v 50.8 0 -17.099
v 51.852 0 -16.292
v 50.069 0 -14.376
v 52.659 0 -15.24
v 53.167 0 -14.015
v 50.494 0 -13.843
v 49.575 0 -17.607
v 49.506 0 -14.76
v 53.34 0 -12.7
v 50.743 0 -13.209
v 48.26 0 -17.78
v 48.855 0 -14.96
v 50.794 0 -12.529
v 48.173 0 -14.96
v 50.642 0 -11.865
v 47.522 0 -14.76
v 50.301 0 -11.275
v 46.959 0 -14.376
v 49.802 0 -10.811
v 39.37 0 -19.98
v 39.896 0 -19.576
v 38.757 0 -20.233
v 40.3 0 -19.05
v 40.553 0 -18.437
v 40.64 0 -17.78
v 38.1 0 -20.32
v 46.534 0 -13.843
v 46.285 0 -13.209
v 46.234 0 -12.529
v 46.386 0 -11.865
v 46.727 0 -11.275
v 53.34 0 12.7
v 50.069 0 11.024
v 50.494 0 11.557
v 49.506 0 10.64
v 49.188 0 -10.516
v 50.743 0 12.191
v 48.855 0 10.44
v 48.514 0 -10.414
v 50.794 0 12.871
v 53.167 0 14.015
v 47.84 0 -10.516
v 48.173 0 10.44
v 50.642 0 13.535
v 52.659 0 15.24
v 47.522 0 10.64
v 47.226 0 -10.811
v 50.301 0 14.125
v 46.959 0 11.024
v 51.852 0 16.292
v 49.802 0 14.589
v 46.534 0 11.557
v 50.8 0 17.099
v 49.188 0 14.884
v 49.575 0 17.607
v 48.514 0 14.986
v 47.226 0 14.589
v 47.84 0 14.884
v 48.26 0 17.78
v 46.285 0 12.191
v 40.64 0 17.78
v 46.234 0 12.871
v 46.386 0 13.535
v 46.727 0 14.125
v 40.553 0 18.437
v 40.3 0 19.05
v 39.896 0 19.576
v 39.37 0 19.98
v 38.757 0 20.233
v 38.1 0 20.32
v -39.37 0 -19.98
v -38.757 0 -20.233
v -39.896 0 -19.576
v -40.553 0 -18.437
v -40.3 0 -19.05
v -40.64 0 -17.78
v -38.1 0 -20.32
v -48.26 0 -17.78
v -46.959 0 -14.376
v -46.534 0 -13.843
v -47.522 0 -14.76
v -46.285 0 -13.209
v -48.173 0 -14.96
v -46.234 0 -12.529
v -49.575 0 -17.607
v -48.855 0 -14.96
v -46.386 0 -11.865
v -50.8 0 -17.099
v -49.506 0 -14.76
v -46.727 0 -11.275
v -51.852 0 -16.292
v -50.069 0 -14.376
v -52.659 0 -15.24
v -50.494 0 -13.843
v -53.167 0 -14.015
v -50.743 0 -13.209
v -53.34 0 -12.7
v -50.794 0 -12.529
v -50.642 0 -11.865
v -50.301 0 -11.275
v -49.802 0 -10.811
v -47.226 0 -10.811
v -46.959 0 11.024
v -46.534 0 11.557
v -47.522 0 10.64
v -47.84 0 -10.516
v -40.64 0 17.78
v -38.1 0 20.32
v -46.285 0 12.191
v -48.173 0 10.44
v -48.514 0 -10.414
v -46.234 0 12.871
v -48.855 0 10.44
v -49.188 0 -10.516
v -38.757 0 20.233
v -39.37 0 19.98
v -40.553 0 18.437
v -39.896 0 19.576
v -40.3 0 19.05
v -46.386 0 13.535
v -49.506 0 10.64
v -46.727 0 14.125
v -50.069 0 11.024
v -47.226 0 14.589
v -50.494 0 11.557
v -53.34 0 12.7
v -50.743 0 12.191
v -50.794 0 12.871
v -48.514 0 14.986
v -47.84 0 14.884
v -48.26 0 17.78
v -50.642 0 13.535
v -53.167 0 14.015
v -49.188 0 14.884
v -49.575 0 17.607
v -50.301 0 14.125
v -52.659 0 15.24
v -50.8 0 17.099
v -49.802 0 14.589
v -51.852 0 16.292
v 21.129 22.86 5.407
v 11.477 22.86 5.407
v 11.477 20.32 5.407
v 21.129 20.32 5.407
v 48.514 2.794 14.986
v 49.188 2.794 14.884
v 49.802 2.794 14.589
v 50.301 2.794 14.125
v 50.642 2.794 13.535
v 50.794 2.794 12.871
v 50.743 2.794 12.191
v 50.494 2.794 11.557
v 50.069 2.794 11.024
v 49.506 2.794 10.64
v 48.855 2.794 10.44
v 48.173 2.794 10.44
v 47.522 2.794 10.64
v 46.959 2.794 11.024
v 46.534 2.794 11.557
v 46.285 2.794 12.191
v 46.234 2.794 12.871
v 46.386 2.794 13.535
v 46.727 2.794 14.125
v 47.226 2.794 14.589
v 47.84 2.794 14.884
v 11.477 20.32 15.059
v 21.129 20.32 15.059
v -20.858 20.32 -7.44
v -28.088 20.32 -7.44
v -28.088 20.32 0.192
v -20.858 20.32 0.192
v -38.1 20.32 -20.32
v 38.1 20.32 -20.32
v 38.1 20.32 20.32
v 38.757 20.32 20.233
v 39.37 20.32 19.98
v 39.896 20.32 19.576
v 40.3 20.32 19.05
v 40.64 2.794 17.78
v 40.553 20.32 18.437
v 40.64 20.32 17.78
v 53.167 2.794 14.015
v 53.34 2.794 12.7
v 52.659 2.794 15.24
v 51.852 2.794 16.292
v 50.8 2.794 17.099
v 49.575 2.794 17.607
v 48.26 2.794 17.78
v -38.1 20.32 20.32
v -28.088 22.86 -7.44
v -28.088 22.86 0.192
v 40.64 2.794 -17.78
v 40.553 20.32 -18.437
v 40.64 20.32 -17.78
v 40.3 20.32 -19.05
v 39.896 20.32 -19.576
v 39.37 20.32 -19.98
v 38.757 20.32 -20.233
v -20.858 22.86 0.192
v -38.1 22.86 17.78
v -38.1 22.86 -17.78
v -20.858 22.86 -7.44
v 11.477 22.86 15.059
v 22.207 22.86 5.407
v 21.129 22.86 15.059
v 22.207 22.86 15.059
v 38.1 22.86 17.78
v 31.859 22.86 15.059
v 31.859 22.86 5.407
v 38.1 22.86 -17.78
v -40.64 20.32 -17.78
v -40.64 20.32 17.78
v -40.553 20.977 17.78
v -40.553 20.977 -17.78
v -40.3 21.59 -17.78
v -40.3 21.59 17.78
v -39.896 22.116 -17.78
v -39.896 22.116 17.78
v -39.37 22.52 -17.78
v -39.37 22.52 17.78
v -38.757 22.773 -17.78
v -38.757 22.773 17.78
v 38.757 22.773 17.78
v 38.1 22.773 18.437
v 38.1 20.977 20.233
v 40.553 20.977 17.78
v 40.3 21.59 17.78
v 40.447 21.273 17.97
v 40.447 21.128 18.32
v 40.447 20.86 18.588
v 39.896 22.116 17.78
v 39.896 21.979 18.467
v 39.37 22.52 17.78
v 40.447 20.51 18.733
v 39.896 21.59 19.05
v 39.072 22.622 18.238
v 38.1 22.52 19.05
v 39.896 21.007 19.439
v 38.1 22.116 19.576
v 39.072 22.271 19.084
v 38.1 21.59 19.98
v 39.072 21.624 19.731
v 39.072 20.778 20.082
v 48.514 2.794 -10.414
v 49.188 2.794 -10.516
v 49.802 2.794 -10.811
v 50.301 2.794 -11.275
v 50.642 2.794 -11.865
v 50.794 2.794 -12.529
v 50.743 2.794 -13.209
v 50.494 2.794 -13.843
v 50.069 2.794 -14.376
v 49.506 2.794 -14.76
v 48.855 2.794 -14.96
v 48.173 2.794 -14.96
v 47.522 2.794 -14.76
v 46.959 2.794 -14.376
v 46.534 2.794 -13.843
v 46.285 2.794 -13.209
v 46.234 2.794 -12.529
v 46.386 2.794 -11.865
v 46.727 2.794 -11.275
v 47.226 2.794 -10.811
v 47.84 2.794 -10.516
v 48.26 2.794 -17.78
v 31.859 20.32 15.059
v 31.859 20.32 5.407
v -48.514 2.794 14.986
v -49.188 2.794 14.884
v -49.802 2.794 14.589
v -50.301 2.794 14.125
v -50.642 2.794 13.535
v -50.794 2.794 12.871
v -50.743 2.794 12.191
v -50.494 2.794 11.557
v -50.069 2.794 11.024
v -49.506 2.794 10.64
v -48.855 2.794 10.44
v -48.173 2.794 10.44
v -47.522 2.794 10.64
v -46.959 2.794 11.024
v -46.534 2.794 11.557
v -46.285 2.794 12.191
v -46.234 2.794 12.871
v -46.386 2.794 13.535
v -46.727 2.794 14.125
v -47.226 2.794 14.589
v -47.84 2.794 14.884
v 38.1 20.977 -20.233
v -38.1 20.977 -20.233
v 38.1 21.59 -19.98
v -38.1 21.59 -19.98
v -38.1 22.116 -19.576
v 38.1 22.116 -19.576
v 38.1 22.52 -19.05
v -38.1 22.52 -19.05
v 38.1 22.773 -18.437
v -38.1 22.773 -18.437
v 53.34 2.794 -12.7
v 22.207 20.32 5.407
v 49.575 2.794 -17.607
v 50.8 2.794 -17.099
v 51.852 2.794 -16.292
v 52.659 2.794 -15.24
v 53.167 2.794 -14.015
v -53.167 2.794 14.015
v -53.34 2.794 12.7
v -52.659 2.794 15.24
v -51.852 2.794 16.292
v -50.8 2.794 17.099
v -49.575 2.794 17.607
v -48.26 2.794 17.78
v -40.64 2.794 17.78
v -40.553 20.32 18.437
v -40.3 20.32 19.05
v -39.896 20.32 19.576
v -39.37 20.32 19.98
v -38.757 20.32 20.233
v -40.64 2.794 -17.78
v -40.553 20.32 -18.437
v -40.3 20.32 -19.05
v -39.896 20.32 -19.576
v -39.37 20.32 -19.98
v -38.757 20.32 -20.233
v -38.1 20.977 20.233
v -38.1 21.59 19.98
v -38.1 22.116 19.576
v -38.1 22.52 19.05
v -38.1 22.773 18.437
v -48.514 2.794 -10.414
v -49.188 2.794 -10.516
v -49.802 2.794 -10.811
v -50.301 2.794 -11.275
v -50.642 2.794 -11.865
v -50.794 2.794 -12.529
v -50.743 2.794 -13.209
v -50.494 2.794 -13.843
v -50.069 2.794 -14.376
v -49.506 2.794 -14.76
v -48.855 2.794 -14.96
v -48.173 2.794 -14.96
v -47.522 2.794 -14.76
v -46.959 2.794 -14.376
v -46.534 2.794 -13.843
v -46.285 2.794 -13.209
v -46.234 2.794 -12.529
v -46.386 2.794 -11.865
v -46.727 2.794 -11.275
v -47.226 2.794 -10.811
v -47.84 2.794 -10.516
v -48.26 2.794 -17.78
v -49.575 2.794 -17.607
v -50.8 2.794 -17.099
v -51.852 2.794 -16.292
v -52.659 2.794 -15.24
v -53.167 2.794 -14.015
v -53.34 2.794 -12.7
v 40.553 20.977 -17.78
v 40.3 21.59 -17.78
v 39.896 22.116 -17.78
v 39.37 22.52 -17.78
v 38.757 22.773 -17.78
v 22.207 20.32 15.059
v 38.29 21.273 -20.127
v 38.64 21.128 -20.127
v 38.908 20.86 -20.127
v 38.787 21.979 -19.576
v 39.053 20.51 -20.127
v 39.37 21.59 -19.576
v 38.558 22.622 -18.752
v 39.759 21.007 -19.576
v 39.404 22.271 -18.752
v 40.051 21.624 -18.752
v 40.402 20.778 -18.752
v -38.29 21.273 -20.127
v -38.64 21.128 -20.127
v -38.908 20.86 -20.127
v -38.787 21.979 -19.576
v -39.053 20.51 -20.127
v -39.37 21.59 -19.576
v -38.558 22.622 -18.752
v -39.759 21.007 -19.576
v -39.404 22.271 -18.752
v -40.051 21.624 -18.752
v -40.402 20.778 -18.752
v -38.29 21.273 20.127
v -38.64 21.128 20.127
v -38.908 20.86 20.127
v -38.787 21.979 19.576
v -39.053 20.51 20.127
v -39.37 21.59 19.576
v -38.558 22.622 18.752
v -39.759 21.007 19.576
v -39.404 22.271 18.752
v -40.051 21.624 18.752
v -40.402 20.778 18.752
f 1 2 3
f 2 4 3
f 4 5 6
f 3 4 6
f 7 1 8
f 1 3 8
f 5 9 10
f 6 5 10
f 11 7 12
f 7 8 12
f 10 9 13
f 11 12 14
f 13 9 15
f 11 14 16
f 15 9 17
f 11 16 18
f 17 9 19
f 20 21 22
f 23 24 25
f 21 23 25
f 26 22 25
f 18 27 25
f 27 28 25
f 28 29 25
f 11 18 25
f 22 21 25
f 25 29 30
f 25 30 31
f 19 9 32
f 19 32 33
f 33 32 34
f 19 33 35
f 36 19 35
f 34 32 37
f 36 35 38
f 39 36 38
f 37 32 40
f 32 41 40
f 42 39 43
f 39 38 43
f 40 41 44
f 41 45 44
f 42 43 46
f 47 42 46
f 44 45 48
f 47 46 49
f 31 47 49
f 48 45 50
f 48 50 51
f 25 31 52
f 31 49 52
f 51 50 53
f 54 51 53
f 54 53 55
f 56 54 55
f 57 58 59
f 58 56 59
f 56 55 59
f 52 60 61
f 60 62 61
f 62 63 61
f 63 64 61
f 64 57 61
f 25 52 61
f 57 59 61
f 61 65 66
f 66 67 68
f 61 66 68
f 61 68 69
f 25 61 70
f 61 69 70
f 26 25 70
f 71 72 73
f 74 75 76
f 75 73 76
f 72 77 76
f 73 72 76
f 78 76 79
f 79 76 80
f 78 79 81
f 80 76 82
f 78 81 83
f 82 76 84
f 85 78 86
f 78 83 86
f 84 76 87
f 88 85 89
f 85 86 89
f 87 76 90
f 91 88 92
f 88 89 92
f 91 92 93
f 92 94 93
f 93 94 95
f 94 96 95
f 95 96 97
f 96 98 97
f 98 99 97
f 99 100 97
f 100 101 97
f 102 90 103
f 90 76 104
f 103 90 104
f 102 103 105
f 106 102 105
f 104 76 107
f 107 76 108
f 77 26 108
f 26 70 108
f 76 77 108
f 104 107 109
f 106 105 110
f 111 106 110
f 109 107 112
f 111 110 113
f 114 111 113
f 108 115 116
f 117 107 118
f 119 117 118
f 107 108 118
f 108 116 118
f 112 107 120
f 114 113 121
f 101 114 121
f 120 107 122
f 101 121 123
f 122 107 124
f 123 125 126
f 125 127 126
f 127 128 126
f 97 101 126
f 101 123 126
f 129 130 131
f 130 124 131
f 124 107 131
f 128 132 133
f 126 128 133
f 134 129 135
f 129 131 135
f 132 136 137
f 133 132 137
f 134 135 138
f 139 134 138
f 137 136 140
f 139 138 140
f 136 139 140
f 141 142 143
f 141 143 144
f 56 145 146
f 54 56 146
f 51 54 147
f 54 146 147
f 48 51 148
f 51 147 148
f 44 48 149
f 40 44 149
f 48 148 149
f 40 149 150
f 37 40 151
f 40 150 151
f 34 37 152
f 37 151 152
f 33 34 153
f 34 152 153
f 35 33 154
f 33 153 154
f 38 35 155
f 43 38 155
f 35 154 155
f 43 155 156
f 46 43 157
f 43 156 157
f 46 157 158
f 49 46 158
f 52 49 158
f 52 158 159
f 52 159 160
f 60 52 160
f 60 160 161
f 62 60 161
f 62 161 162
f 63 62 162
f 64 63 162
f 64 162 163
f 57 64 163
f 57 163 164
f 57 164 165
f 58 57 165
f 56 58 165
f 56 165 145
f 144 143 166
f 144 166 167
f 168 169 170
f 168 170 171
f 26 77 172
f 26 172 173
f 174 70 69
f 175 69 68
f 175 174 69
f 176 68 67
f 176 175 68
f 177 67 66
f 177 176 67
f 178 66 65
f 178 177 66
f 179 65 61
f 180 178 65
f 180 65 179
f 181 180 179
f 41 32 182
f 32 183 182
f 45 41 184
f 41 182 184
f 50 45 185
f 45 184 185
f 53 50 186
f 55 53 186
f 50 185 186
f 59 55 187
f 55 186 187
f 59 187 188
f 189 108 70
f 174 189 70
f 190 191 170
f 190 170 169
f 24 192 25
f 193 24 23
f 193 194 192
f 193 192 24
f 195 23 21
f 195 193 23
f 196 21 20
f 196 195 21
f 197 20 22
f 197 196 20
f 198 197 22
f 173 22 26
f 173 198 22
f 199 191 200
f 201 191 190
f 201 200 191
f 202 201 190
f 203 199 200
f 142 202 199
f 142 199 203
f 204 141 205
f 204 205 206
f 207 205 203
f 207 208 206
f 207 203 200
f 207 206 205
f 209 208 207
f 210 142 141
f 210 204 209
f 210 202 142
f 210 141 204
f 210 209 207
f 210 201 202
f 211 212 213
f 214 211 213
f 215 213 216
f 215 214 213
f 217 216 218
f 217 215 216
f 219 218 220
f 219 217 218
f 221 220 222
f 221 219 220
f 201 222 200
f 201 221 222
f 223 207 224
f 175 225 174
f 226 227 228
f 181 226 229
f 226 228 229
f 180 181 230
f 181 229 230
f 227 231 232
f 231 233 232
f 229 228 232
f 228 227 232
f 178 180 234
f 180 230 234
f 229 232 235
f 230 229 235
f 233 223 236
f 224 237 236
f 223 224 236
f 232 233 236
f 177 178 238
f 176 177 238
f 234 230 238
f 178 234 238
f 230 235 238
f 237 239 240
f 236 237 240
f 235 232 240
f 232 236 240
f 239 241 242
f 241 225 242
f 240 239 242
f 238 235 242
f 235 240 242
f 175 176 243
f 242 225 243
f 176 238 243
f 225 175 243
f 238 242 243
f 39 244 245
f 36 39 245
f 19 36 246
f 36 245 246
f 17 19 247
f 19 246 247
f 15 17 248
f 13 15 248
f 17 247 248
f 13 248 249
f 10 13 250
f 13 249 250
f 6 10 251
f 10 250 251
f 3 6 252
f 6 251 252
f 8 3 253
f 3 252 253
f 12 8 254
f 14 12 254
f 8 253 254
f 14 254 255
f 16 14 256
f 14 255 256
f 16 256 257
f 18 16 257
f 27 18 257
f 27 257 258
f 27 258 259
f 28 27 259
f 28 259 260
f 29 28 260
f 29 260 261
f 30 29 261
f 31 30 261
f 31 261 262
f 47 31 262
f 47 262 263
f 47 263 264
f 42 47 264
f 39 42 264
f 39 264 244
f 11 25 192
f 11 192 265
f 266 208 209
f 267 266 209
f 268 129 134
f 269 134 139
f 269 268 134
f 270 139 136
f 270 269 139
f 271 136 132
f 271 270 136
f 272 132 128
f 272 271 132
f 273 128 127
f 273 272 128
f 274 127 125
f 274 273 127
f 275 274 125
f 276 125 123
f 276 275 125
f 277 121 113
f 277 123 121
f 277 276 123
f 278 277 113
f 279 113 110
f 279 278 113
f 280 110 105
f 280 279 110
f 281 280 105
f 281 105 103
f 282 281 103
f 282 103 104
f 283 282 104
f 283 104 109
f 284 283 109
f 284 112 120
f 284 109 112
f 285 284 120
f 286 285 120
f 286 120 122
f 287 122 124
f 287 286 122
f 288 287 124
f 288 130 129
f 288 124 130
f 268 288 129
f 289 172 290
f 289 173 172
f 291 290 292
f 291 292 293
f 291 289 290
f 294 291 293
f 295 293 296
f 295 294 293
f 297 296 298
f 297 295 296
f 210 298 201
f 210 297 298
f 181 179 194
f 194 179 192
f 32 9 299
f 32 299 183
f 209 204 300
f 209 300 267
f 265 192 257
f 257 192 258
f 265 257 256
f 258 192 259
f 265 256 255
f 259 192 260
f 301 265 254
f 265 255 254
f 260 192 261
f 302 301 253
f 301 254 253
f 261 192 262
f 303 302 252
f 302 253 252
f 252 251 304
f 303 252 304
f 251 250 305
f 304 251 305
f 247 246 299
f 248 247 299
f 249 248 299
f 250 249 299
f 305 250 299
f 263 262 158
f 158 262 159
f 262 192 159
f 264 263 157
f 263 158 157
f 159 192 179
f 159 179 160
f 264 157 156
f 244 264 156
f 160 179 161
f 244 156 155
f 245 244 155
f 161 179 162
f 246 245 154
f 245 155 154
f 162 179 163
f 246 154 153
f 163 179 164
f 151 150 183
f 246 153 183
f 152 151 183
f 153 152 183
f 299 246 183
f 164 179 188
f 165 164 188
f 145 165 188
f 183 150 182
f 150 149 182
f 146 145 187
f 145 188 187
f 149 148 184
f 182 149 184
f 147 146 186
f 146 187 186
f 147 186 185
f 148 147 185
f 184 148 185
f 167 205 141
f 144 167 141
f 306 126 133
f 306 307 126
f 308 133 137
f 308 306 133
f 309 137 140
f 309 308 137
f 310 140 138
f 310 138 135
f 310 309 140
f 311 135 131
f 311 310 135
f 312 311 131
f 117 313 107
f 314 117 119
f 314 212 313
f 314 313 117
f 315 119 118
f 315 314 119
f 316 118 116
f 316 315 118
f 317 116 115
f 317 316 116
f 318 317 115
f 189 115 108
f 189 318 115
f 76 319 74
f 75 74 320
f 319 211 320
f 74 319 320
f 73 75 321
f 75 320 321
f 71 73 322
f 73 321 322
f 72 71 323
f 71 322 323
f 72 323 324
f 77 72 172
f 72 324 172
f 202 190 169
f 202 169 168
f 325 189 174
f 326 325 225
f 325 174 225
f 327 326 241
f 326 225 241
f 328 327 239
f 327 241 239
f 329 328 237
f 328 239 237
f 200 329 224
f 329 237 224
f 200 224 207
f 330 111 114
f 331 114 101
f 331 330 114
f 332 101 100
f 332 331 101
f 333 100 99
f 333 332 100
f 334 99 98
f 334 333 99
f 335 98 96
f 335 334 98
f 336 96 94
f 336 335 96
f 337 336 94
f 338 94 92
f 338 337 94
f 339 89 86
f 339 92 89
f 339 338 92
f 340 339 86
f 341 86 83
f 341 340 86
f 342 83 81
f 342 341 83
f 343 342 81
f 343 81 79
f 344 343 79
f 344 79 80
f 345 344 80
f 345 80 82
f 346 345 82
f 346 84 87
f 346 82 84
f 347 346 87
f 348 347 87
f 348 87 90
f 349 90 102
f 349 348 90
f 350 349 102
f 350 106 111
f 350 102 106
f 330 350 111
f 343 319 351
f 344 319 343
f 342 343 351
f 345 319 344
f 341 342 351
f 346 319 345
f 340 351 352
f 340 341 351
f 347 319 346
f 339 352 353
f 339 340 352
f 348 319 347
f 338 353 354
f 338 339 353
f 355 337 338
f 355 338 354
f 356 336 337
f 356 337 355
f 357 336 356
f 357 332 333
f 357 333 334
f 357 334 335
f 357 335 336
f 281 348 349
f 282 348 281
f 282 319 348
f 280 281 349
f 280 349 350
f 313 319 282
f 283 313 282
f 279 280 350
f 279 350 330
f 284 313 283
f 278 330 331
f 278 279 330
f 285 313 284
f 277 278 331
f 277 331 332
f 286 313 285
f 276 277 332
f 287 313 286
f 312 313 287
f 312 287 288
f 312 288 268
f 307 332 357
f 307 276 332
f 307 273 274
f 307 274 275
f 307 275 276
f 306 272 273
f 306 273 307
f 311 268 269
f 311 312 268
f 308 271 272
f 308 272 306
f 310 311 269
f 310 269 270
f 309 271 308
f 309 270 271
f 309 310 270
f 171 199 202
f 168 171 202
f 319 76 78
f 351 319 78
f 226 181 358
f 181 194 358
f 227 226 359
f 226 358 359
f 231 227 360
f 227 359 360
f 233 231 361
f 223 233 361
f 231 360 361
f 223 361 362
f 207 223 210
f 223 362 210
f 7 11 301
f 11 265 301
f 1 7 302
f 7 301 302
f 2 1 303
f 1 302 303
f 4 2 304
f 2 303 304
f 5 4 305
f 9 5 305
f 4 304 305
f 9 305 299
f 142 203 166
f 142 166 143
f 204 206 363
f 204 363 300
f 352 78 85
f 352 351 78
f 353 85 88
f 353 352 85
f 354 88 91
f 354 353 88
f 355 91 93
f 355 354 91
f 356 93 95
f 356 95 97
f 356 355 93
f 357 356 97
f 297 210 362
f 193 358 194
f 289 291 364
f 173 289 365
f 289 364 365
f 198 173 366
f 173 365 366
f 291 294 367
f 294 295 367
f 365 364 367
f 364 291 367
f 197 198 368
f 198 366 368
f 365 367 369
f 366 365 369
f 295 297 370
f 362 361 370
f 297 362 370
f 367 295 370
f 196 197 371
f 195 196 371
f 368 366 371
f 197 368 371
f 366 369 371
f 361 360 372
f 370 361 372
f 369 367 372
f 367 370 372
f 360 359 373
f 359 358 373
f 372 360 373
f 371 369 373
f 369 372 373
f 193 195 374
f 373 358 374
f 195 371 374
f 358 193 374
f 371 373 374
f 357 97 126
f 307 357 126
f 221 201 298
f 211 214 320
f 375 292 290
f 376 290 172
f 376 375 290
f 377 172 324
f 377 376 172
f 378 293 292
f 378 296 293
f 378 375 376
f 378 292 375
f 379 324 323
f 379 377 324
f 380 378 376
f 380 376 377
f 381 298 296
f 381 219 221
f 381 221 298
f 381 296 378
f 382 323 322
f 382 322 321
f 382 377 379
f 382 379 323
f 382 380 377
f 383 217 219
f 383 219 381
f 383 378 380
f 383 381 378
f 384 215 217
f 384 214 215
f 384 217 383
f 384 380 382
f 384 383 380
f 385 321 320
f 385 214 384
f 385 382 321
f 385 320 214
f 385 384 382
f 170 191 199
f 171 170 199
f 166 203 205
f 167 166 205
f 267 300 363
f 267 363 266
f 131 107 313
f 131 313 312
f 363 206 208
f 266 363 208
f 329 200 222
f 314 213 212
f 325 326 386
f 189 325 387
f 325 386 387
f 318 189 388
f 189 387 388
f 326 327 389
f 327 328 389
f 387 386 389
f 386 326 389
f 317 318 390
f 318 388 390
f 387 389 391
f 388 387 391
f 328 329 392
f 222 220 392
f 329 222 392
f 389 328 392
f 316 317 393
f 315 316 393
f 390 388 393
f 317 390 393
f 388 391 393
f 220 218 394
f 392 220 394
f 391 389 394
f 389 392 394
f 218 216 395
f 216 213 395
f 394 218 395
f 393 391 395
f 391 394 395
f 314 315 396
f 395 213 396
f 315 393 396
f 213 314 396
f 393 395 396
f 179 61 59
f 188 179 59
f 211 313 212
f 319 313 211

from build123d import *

# Parameters (mm, degrees)
SKETCH1_W            = 81.28
SKETCH1_H            = 40.64
BOSS_EXTRUDE1_DEPTH  = 22.86
FILLET1_R            = 2.54
SKETCH2_W            = 12.7
SKETCH2_H            = 35.56
BOSS_EXTRUDE2_DEPTH  = 2.794
FILLET2_R            = 5.08
SKETCH3_R            = 2.286
CUT_EXTRUDE1_DEPTH   = 61.503738364
FILLET2_OF_MIRROR1_R = 5.08
SKETCH4_W            = 7.230266788
SKETCH4_H            = 7.631948276
SKETCH4_W_2          = 9.652
SKETCH4_H_2          = 9.652
CUT_EXTRUDE2_DEPTH   = 2.54


with BuildPart() as part:
    # Sketch1 → Boss-Extrude1 (new body)
    with BuildSketch(Plane(origin=(0, 0, 0), x_dir=(1, 0, 0), z_dir=(0, 1, 0))):
        Rectangle(SKETCH1_W, SKETCH1_H)
    extrude(amount=BOSS_EXTRUDE1_DEPTH)

    # Fillet1
    fillet1_edges = [part.edges().sort_by_distance(p)[0] for p in [
        (-40.64, 22.86, 0),
        (0, 22.86, 20.32),
        (40.64, 22.86, 0),
        (0, 22.86, -20.32),
        (40.64, 11.43, 20.32),
        (-40.64, 11.43, 20.32),
        (-40.64, 11.43, -20.32),
        (40.64, 11.43, -20.32),
    ]]
    fillet(fillet1_edges, radius=FILLET1_R)

    # Sketch2 → Boss-Extrude2 (add)
    with BuildSketch(Plane.XZ):
        with Locations((46.99, 0)):
            Rectangle(SKETCH2_W, SKETCH2_H)
    boss_extrude2 = extrude(amount=-BOSS_EXTRUDE2_DEPTH)

    # Fillet2
    fillet2_edges = [part.edges().sort_by_distance(p)[0] for p in [
        (53.34, 1.397, 17.78),
        (53.34, 1.397, -17.78),
    ]]
    fillet(fillet2_edges, radius=FILLET2_R)

    # Sketch3 → Cut-Extrude1 (cut, through all)
    with BuildSketch(Plane(origin=(0, 2.794, 0), x_dir=(1, 0, 0), z_dir=(0, 1, 0))):
        with Locations(Location((48.514, 12.7, 0), (0, 0, 270))):
            Circle(SKETCH3_R)
        with Locations(Location((48.514, -12.7, 0), (0, 0, 270))):
            Circle(SKETCH3_R)
    cut_extrude1 = extrude(amount=-CUT_EXTRUDE1_DEPTH, mode=Mode.SUBTRACT)

    # Mirror1: Boss-Extrude2, Cut-Extrude1 across plane
    add(boss_extrude2.mirror(Plane(origin=(0, 0, 0), x_dir=(0, 0, 1), z_dir=(1, 0, 0))))
    add(cut_extrude1.mirror(Plane(origin=(0, 0, 0), x_dir=(0, 0, 1), z_dir=(1, 0, 0))), mode=Mode.SUBTRACT)

    # Fillet2 of Mirror1
    fillet2_of_mirror1_edges = [part.edges().sort_by_distance(p)[0] for p in [
        (-53.34, 1.397, 17.78),
        (-53.34, 1.397, -17.78),
    ]]
    fillet(fillet2_of_mirror1_edges, radius=FILLET2_OF_MIRROR1_R)

    # Sketch4 → Cut-Extrude2 (cut)
    with BuildSketch(Plane(origin=(0, 22.86, 0), x_dir=(1, 0, 0), z_dir=(0, 1, 0))):
        with Locations((-24.473297313, 3.624026455)):
            Rectangle(SKETCH4_W, SKETCH4_H)
        with Locations((16.303343502, -10.232970532)):
            Rectangle(SKETCH4_W_2, SKETCH4_H_2)
        with Locations((27.032885284, -10.232970532)):
            Rectangle(SKETCH4_W_2, SKETCH4_H_2)
    extrude(amount=-CUT_EXTRUDE2_DEPTH, mode=Mode.SUBTRACT)


solid = part.part
